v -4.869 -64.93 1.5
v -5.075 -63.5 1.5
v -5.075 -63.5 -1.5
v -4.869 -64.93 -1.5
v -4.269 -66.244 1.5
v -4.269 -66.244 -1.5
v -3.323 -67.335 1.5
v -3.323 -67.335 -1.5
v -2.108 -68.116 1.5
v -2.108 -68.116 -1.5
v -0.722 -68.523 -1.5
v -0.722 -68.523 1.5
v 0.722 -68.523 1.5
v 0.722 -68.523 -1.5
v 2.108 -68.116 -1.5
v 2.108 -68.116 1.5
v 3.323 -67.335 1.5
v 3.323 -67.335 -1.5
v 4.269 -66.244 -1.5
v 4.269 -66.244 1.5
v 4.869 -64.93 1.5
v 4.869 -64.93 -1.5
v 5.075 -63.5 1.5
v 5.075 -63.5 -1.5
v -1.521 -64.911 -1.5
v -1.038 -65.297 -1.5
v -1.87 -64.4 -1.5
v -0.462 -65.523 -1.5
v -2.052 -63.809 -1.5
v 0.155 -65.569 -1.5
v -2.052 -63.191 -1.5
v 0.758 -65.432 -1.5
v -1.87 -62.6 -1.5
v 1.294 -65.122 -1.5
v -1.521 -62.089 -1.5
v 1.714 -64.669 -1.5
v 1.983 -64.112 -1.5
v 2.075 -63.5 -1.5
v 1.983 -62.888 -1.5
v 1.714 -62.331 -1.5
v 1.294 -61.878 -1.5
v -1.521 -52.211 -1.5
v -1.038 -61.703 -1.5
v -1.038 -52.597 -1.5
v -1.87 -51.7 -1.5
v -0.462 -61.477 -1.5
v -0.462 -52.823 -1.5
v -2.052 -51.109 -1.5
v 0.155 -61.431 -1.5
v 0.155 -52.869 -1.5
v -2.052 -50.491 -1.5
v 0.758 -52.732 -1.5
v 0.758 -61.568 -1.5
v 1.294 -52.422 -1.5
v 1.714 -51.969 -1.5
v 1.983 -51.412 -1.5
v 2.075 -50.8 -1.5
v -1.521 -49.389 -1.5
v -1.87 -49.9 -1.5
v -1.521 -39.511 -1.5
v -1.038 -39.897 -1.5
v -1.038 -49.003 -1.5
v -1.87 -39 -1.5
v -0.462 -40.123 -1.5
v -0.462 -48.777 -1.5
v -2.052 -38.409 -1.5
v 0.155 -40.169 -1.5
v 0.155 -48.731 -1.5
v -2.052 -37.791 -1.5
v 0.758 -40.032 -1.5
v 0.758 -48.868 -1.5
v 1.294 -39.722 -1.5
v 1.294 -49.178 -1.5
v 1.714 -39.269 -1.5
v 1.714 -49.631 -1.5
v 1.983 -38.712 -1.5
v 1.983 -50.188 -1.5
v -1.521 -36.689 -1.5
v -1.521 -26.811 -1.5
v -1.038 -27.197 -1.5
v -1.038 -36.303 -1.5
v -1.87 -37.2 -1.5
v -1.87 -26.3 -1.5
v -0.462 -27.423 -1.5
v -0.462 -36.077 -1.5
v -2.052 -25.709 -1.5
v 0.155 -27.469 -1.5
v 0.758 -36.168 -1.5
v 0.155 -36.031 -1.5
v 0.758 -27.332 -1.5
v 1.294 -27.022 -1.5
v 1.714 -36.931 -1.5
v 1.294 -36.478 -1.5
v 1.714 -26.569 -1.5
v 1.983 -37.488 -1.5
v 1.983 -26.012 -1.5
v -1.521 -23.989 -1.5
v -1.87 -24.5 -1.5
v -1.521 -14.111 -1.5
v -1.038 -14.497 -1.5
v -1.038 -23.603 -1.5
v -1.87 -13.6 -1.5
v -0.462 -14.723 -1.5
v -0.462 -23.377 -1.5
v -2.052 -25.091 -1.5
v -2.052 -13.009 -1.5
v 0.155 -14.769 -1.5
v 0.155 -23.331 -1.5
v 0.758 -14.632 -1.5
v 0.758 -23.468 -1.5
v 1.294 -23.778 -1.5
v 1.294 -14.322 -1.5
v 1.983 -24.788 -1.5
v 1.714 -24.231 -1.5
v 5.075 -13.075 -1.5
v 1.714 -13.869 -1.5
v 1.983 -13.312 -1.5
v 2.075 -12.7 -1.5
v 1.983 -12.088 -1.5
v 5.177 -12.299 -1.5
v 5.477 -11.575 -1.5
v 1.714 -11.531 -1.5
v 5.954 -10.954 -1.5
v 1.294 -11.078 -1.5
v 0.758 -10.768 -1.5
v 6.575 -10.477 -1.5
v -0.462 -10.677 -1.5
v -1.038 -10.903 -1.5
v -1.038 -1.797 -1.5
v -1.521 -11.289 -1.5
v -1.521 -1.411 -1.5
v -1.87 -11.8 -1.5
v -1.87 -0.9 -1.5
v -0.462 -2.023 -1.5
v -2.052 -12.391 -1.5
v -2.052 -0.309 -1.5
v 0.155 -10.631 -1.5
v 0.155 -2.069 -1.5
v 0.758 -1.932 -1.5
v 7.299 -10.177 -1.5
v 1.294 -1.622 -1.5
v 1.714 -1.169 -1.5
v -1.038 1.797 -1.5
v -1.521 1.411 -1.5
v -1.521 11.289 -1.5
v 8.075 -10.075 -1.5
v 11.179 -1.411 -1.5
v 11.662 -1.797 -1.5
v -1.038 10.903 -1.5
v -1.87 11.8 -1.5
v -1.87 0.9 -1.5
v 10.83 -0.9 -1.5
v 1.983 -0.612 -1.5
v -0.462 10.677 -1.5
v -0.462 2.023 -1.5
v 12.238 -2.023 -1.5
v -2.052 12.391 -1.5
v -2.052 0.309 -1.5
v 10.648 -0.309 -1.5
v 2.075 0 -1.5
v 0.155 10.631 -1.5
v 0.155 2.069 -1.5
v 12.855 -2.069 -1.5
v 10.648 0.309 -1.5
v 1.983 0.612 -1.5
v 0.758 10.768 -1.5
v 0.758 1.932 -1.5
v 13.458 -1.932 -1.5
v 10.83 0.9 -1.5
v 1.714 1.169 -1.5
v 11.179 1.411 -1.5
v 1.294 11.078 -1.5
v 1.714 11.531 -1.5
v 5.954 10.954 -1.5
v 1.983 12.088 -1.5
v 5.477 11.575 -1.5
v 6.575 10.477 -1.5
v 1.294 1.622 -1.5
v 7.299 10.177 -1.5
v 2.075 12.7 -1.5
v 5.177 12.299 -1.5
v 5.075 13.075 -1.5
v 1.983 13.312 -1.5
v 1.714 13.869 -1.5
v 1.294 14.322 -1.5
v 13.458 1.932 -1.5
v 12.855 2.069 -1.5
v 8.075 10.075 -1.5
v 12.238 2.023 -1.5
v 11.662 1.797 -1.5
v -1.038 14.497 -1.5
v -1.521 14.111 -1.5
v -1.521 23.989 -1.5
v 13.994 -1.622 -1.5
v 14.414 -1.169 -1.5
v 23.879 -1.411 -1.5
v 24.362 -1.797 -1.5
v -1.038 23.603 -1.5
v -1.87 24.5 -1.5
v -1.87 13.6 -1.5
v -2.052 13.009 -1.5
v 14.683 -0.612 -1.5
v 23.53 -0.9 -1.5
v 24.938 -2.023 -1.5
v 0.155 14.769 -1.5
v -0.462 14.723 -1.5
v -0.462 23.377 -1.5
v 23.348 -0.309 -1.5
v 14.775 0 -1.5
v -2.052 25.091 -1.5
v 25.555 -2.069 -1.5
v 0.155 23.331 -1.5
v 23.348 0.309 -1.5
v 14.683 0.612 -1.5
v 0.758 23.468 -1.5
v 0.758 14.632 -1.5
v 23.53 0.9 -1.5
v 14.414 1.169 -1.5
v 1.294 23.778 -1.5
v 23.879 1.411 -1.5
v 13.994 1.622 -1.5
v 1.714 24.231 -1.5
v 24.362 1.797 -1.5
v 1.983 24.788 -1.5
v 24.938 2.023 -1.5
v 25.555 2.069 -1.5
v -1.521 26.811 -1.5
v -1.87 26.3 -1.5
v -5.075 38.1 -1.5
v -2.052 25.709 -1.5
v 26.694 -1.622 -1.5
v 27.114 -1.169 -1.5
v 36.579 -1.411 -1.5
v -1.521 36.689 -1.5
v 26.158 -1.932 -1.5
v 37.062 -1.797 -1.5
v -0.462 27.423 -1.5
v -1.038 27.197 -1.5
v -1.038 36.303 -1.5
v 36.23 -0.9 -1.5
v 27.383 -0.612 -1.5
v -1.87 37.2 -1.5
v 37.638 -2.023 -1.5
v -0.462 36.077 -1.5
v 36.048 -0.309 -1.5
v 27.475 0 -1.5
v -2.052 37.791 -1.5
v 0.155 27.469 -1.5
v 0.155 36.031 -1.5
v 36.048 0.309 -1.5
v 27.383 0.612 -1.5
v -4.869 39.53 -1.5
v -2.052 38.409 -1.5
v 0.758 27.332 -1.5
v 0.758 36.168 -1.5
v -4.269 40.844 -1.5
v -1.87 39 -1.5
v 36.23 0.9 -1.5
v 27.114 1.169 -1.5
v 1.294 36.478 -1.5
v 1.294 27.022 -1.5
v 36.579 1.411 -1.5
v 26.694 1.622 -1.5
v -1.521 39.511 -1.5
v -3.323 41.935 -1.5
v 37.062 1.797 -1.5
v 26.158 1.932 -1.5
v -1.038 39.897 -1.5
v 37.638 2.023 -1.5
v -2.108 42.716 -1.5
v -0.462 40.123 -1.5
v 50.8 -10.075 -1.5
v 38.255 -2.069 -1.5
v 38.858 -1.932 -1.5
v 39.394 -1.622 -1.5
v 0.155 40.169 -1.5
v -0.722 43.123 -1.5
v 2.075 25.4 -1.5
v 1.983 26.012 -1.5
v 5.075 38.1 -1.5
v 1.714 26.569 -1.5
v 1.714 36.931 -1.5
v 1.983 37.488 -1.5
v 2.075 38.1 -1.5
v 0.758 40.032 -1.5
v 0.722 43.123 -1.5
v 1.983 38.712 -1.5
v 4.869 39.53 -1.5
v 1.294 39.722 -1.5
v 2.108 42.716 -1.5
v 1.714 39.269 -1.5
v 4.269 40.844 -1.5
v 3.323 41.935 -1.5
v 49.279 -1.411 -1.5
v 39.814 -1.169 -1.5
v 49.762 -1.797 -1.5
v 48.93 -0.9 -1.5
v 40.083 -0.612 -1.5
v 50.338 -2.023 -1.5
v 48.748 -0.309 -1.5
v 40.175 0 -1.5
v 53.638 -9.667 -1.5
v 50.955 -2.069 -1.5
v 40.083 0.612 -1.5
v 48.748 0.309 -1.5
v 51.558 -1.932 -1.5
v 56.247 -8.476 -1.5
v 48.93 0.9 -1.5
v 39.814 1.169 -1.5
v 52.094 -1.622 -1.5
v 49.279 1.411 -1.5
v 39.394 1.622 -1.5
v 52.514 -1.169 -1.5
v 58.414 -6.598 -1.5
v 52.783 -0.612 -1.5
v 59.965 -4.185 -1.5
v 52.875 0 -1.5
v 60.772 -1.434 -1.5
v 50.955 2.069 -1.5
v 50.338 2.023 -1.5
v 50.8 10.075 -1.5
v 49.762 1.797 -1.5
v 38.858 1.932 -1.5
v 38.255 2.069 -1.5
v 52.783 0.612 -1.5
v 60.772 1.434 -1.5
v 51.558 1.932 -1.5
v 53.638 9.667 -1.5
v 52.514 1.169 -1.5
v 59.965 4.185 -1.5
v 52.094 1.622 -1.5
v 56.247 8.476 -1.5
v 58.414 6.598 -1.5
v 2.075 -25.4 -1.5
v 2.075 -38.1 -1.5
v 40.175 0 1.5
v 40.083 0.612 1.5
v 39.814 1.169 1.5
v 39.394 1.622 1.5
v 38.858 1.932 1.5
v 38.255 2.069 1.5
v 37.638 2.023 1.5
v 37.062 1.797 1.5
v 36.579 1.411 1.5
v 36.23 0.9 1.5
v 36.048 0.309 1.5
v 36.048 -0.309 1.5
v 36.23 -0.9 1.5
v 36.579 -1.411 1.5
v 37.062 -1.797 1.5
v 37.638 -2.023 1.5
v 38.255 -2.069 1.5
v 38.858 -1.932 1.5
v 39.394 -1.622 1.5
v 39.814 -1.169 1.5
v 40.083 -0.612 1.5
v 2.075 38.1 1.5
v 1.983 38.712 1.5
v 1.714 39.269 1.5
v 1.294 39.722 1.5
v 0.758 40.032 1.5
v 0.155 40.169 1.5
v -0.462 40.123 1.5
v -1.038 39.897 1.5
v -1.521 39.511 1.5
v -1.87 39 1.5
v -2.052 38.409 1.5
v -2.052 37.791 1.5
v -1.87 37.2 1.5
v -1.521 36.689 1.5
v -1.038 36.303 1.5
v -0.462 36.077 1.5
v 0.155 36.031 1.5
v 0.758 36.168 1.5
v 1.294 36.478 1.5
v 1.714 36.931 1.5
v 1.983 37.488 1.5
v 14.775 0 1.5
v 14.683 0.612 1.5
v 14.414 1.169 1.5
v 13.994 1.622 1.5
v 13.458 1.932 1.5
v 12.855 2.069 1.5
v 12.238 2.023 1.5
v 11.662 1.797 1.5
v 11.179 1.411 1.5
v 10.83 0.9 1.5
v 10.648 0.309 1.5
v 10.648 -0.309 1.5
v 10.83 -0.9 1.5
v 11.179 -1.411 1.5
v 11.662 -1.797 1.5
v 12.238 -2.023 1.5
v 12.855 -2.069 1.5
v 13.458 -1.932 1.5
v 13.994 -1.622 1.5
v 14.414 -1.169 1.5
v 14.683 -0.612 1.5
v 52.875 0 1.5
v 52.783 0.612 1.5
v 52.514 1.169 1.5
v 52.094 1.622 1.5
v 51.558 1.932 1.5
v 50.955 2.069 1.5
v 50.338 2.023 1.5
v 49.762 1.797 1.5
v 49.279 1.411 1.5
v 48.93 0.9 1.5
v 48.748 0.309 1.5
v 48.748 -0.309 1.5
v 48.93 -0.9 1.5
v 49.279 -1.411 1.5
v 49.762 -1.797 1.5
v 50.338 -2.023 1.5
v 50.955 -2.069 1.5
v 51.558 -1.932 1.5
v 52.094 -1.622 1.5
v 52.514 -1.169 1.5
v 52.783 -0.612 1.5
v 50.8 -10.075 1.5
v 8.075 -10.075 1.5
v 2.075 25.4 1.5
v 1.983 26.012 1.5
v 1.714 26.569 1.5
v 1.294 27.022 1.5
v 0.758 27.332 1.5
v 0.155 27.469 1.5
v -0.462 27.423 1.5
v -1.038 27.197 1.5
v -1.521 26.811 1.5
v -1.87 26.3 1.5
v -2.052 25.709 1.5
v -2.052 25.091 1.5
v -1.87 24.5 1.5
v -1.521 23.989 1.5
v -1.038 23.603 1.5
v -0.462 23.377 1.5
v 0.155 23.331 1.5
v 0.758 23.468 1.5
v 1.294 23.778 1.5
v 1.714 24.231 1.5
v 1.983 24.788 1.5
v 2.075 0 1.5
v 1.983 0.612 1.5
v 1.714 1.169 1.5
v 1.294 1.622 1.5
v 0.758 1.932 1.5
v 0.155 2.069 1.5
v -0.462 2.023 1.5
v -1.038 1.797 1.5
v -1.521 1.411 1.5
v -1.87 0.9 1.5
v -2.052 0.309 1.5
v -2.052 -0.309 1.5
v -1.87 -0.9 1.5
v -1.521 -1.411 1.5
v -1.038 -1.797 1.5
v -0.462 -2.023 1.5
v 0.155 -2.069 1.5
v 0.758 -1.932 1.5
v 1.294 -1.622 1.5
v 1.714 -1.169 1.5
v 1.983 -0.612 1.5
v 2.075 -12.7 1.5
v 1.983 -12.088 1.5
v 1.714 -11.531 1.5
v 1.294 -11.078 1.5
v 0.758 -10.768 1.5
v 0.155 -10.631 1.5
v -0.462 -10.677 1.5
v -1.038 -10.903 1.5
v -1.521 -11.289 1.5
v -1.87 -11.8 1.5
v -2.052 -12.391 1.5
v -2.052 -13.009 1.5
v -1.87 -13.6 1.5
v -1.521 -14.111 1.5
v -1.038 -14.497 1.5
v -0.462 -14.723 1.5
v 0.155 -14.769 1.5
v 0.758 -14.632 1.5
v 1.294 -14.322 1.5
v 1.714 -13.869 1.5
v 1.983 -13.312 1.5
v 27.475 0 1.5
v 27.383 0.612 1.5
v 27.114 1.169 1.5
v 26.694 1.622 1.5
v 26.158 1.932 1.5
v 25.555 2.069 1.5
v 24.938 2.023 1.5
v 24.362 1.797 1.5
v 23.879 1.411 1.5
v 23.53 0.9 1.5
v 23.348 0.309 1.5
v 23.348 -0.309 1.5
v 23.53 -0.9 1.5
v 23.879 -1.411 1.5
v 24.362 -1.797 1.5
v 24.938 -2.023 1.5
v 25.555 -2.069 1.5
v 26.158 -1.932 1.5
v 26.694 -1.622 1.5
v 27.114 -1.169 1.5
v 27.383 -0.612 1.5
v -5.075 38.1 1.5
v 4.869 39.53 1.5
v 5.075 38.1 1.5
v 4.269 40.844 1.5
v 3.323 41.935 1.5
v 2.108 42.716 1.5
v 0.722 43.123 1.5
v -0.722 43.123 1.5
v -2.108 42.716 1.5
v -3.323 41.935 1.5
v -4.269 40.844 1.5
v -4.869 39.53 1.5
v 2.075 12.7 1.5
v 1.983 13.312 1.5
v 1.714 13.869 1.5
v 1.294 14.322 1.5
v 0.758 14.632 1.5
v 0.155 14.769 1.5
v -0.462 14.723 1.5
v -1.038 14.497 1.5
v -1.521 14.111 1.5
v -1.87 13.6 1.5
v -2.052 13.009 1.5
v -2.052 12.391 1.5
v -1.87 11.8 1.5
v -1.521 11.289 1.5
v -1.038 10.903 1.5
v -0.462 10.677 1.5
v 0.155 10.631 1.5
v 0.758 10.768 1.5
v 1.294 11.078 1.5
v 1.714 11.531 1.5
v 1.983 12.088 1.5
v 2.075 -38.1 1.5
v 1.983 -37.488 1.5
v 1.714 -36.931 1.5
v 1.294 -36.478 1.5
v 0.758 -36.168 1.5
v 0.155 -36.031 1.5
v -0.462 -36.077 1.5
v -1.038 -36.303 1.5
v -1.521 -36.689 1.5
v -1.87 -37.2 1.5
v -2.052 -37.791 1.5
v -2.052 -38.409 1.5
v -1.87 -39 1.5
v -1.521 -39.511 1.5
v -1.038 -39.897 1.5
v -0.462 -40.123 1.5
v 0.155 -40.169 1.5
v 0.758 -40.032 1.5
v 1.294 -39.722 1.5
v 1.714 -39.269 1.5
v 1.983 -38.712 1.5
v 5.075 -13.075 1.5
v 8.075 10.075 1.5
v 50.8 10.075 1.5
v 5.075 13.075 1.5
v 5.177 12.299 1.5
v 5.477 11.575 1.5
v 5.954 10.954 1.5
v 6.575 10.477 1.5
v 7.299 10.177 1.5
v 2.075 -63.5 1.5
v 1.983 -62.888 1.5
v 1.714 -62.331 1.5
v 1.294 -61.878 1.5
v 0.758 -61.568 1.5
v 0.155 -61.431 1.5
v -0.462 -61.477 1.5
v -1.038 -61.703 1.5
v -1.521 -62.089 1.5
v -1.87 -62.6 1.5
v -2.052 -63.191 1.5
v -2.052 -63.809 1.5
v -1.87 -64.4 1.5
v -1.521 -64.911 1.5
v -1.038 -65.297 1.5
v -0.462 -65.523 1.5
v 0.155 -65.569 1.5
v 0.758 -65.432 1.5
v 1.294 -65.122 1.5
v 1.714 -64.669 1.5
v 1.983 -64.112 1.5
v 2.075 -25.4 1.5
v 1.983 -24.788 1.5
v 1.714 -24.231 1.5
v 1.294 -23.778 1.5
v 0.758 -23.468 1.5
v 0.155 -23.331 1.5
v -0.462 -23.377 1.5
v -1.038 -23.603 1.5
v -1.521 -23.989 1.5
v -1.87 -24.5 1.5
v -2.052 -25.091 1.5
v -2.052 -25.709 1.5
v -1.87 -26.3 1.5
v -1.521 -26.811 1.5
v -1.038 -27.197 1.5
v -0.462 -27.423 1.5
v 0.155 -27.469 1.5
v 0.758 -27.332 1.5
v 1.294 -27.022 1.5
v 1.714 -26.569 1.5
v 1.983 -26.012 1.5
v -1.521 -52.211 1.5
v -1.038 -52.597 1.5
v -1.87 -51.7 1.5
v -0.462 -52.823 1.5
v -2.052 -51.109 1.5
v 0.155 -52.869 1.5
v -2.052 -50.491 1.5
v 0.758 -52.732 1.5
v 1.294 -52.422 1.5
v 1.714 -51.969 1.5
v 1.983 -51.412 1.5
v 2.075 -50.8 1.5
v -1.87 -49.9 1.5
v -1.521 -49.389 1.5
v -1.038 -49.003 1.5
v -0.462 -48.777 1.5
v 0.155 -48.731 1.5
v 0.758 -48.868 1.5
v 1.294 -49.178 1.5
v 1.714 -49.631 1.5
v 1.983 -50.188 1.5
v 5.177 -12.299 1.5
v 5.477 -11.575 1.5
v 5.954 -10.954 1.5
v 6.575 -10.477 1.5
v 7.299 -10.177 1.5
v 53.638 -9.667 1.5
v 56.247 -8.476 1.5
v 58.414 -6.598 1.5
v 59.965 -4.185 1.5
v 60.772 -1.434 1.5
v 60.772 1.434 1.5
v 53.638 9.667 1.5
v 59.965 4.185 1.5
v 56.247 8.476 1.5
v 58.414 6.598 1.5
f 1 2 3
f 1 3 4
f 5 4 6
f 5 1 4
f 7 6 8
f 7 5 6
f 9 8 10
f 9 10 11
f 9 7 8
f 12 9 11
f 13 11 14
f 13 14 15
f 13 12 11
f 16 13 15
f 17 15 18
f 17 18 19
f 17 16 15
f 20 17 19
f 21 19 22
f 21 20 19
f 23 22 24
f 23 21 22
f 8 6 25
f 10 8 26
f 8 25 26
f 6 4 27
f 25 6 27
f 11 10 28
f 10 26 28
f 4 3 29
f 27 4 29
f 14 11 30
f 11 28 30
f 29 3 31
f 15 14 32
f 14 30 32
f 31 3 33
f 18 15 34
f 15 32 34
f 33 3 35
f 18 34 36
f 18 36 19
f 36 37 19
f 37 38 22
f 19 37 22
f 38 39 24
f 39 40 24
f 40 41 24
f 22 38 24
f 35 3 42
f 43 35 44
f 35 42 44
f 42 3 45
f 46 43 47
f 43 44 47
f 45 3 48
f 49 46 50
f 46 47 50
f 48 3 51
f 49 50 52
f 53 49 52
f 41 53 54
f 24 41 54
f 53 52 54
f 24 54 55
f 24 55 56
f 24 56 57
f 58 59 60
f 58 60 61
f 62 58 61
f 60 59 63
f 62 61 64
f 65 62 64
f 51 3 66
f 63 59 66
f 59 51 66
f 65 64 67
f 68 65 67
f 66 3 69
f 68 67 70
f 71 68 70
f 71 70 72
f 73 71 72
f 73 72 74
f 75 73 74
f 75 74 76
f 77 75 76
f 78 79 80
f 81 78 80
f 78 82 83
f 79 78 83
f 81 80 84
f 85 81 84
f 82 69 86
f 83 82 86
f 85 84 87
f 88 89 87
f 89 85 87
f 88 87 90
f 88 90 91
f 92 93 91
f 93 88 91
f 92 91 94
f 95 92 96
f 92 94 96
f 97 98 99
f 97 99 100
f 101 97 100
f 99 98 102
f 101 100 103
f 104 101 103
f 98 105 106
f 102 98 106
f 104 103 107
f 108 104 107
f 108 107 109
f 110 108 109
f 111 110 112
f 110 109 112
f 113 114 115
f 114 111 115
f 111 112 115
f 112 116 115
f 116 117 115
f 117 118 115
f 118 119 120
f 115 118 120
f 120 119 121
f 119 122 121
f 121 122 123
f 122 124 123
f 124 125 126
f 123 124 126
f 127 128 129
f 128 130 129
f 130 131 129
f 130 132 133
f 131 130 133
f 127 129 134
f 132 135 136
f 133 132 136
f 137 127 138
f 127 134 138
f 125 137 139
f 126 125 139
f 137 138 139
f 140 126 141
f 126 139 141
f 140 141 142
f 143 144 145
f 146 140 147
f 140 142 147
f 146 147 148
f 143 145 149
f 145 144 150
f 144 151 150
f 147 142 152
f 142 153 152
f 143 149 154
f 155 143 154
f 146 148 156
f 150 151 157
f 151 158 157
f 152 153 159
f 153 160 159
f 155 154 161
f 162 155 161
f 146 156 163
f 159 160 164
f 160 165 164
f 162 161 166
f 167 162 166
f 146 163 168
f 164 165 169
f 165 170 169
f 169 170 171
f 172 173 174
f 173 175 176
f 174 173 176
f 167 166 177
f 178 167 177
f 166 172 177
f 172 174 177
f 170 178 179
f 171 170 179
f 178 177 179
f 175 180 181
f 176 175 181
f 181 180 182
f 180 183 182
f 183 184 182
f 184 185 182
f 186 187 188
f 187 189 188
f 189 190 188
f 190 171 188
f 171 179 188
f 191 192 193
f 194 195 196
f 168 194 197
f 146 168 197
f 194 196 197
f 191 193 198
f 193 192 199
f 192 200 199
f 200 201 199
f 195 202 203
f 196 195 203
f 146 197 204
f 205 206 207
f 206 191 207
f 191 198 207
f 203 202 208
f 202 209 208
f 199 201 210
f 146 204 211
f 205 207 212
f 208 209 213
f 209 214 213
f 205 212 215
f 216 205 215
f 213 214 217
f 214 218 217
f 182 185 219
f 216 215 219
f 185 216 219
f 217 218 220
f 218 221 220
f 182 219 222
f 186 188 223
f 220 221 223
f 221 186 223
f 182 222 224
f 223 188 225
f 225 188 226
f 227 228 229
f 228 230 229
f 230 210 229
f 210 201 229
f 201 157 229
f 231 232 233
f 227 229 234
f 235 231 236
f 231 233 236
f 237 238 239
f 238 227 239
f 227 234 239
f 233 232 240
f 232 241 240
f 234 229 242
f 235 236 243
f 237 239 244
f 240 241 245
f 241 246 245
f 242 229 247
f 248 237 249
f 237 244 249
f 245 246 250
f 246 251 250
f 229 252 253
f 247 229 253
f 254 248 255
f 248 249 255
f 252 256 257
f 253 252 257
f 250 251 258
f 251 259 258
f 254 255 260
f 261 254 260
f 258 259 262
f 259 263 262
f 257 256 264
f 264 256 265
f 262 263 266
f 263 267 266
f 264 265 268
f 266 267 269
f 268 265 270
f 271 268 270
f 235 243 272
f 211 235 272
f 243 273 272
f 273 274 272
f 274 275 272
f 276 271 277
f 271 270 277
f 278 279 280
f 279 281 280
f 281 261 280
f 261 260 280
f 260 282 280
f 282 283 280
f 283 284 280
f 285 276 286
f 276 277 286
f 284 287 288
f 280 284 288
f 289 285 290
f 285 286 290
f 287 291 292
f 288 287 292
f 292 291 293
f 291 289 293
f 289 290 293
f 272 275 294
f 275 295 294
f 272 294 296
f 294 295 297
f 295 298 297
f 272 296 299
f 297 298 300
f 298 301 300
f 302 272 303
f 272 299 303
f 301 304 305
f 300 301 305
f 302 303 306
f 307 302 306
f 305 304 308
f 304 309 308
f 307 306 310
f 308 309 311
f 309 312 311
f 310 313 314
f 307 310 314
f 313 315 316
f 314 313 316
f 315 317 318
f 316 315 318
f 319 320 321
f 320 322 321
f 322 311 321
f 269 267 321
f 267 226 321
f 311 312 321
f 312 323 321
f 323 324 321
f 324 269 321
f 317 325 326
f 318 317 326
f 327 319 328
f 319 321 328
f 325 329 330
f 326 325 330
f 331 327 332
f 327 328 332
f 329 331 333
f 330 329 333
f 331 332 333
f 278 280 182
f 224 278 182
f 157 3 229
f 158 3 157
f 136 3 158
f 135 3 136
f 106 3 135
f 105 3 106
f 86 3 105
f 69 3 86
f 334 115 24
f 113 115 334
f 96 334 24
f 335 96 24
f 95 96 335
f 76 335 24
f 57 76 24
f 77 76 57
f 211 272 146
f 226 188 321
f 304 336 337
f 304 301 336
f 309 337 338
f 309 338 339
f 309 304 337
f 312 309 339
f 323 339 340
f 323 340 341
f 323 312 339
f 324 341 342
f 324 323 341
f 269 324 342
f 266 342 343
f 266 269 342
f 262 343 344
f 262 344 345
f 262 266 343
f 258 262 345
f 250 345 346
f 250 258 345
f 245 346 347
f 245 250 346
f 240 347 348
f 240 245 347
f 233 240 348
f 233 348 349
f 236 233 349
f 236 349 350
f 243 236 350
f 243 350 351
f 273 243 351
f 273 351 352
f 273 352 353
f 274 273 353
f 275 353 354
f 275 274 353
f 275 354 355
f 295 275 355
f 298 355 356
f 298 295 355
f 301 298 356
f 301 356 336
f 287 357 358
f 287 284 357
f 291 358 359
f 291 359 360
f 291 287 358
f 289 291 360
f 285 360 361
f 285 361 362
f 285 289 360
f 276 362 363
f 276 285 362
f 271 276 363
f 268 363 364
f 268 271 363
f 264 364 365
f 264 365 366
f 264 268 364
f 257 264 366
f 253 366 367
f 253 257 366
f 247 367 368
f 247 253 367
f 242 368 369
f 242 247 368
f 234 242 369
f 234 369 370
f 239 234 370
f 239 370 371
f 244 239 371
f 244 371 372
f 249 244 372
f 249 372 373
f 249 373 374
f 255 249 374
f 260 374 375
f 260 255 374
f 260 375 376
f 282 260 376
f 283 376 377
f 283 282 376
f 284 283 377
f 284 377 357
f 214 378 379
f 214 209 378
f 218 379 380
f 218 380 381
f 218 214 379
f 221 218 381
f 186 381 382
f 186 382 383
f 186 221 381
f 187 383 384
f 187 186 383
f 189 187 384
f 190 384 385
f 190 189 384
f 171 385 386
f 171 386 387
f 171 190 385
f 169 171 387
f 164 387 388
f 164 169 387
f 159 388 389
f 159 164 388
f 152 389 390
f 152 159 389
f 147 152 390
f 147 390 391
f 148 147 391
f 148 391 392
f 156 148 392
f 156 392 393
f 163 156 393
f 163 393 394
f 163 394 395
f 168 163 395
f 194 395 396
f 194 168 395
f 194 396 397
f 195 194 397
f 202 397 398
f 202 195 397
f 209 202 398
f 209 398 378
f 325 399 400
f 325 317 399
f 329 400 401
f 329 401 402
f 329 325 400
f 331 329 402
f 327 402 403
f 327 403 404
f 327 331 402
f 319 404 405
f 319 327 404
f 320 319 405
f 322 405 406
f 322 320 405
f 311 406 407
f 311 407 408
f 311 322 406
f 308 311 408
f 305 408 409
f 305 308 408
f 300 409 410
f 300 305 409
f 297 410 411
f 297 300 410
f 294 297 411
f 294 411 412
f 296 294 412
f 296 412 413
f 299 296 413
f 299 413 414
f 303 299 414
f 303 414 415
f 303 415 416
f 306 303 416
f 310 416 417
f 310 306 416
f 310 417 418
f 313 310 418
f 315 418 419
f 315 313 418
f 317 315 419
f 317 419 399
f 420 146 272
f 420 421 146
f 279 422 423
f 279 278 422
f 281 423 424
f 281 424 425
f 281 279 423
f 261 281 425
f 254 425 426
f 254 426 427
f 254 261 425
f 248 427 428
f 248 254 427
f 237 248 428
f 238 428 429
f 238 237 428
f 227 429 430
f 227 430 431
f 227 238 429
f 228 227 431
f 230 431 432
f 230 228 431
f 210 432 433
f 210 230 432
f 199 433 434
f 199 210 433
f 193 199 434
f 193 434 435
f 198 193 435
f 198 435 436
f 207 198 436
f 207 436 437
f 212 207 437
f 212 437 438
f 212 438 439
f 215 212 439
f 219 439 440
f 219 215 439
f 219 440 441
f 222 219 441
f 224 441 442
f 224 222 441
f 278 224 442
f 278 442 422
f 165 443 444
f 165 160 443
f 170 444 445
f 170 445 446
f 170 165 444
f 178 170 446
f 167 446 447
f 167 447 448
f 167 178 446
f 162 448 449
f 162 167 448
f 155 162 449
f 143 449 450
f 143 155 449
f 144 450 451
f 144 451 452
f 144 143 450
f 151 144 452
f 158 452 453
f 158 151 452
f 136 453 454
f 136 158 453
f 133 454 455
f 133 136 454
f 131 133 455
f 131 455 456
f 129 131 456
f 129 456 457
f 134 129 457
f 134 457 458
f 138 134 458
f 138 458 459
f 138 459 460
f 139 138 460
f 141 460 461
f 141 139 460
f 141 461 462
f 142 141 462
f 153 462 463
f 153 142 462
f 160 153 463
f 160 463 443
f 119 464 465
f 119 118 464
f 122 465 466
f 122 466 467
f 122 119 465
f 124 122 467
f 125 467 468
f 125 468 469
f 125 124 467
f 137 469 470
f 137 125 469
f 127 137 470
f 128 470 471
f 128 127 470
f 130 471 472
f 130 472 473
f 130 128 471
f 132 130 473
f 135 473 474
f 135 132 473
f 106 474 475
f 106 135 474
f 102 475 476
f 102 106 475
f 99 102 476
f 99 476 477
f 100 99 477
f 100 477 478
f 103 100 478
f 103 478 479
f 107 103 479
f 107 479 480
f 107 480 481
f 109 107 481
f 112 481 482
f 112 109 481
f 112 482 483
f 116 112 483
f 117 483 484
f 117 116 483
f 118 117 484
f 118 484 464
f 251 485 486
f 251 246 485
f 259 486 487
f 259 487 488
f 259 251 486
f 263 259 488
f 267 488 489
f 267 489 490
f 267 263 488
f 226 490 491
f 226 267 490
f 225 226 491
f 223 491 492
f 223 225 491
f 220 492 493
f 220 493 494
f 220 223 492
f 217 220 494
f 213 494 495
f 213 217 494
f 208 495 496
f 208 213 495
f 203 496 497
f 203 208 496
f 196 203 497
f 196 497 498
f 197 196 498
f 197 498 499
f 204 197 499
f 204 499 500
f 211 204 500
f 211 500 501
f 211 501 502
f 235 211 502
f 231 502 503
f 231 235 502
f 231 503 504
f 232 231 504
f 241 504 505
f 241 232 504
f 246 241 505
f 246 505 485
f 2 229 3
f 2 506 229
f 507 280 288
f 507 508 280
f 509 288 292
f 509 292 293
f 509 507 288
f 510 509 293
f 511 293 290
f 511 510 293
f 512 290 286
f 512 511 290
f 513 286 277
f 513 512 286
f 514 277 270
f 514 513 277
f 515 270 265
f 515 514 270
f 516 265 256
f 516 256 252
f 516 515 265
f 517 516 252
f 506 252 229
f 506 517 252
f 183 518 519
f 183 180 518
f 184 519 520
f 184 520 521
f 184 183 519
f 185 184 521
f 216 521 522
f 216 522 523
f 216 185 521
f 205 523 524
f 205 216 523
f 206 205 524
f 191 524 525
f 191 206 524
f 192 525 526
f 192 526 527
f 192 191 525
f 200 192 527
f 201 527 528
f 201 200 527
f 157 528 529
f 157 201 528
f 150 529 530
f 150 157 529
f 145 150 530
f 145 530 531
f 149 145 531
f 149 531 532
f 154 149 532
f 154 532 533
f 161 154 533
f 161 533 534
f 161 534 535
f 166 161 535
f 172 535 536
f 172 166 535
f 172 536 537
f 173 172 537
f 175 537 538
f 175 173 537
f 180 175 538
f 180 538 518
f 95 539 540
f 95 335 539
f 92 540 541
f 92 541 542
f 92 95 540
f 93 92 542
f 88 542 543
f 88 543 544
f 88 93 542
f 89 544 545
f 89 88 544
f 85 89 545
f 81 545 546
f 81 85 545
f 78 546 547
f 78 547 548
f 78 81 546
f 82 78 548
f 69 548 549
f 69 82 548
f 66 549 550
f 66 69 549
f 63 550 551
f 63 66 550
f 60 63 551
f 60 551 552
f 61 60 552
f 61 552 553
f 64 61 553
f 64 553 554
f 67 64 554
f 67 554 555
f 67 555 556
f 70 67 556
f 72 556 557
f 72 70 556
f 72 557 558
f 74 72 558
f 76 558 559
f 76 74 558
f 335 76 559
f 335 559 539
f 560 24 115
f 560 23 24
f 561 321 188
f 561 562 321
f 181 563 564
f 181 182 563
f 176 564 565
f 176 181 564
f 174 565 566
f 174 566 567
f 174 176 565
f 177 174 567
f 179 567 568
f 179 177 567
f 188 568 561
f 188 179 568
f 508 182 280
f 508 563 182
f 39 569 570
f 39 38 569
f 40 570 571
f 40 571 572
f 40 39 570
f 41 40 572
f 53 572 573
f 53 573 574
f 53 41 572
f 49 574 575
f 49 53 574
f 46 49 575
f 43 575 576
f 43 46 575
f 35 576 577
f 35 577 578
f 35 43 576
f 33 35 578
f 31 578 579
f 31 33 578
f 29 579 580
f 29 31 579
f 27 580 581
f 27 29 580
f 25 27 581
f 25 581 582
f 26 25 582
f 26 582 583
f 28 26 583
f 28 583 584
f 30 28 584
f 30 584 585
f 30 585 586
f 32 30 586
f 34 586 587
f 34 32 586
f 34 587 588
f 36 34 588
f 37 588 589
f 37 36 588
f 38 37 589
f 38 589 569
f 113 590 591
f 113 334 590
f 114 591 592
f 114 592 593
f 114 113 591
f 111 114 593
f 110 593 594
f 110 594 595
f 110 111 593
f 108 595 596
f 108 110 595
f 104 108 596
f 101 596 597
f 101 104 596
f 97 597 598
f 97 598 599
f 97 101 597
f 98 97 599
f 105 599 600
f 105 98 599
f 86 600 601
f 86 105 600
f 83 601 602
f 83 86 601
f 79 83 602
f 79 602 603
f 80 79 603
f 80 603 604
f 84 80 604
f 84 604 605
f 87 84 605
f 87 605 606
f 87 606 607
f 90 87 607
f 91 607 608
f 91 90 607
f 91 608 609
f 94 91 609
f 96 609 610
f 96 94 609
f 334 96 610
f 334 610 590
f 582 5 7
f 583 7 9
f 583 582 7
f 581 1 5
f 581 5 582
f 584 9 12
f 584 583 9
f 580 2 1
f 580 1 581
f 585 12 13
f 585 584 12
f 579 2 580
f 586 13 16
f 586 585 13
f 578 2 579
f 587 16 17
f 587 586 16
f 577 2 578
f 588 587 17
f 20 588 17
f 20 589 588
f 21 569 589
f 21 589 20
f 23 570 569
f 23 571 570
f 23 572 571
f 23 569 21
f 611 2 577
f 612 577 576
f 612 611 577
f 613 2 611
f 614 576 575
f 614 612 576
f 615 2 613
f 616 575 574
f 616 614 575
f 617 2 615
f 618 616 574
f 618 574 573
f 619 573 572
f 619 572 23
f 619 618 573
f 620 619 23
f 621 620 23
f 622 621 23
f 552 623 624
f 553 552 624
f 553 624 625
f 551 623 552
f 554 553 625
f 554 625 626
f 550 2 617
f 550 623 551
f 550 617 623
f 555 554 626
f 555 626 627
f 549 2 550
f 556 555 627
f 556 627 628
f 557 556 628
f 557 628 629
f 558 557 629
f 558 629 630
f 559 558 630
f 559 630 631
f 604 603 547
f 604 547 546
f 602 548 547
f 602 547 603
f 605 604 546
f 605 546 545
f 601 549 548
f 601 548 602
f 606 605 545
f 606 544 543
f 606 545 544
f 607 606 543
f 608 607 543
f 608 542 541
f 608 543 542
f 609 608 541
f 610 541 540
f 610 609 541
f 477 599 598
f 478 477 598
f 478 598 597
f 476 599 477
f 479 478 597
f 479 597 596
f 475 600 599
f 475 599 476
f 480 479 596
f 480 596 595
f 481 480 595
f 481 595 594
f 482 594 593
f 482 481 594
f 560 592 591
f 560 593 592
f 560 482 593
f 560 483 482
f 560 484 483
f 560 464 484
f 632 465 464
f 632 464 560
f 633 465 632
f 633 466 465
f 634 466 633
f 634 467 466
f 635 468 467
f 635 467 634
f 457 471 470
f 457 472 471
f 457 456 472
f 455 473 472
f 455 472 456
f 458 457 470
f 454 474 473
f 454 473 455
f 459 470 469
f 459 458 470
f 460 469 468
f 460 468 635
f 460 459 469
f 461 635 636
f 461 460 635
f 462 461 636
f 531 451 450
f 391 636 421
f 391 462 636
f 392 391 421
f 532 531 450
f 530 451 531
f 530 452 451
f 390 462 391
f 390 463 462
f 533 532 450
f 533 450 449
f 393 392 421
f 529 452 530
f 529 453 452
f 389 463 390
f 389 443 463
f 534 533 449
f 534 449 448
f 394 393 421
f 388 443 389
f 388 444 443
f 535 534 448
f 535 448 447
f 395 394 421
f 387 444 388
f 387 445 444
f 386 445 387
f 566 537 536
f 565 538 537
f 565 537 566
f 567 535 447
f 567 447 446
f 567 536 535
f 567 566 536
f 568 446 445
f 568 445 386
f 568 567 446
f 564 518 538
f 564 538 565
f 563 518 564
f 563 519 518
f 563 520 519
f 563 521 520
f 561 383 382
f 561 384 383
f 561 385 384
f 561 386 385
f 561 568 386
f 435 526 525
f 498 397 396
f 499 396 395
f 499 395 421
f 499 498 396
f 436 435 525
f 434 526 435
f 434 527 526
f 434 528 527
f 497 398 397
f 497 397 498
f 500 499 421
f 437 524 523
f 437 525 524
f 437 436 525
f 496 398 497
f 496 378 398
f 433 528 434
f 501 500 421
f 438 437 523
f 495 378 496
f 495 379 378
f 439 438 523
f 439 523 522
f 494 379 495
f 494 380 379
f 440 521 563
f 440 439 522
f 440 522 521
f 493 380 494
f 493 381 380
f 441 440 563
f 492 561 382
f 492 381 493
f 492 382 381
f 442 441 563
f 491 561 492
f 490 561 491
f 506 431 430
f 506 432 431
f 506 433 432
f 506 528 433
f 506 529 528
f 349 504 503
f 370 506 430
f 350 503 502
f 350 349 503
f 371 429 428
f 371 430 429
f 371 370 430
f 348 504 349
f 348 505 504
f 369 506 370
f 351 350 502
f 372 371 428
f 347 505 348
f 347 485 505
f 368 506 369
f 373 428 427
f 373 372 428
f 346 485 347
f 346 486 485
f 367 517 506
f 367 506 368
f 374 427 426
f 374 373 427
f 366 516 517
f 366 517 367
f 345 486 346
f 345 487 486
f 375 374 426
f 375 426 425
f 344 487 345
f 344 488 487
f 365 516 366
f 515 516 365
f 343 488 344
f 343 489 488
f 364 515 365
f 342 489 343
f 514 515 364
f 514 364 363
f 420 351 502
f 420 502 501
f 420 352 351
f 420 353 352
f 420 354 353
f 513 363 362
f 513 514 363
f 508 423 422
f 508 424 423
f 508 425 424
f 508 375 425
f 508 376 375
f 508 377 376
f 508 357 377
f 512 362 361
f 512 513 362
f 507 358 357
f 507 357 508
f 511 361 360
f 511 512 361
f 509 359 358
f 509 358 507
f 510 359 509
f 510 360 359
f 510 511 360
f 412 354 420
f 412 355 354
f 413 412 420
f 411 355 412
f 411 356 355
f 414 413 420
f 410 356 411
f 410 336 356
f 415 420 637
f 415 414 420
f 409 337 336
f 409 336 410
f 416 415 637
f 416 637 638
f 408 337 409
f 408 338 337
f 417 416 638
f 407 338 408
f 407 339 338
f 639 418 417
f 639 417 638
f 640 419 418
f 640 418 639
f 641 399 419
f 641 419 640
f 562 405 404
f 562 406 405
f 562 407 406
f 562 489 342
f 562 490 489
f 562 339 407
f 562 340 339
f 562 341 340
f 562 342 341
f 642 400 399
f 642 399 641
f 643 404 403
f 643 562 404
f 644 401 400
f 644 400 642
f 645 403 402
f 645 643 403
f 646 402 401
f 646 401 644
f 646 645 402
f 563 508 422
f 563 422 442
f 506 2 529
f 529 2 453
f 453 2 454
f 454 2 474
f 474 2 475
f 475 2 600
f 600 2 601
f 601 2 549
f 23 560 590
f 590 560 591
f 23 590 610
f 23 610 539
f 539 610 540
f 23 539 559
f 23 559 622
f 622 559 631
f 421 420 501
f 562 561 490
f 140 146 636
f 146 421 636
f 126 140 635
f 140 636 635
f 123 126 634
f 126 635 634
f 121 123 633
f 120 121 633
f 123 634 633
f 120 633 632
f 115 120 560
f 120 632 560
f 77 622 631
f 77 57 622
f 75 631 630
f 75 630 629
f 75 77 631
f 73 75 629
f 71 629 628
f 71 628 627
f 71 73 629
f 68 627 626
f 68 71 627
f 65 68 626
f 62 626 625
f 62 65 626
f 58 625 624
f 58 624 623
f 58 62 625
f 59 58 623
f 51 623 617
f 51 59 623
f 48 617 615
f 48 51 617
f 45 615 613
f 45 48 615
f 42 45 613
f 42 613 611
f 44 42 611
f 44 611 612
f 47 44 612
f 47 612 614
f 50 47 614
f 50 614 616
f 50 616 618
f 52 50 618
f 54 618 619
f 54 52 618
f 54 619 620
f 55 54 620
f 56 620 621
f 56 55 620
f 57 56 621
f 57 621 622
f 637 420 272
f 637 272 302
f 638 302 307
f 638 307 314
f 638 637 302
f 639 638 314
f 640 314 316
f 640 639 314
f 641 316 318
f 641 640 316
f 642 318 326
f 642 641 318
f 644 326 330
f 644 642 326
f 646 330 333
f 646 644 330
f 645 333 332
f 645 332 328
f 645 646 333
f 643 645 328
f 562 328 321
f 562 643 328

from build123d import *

# Parameters (mm, degrees)
SKETCH1_R           = 2.075
BOSS_EXTRUDE2_DEPTH = 1.5
FILLET2_R           = 3


with BuildPart() as part:
    # Sketch1 → Boss-Extrude2 (new, symmetric)
    with BuildSketch(Plane.XY):
        with BuildLine():
            Line((-5.075, 38.1), (-5.075, -63.5))
            ThreePointArc((-5.075, -63.5), (0, -68.575), (5.075, -63.5))
            Line((5.075, -63.5), (5.075, -10.075))
            Line((5.075, -10.075), (50.8, -10.075))
            ThreePointArc((50.8, -10.075), (60.875, 0), (50.8, 10.075))
            Line((50.8, 10.075), (5.075, 10.075))
            Line((5.075, 10.075), (5.075, 38.1))
            ThreePointArc((5.075, 38.1), (0, 43.175), (-5.075, 38.1))
        make_face()
        Circle(SKETCH1_R, mode=Mode.SUBTRACT)
        with Locations((12.7, 0)):
            Circle(SKETCH1_R, mode=Mode.SUBTRACT)
        with Locations((25.4, 0)):
            Circle(SKETCH1_R, mode=Mode.SUBTRACT)
        with Locations((38.1, 0)):
            Circle(SKETCH1_R, mode=Mode.SUBTRACT)
        with Locations((50.8, 0)):
            Circle(SKETCH1_R, mode=Mode.SUBTRACT)
        with Locations((0, 12.7)):
            Circle(SKETCH1_R, mode=Mode.SUBTRACT)
        with Locations((0, 25.4)):
            Circle(SKETCH1_R, mode=Mode.SUBTRACT)
        with Locations((0, 38.1)):
            Circle(SKETCH1_R, mode=Mode.SUBTRACT)
        with Locations((0, -12.7)):
            Circle(SKETCH1_R, mode=Mode.SUBTRACT)
        with Locations((0, -25.4)):
            Circle(SKETCH1_R, mode=Mode.SUBTRACT)
        with Locations((0, -38.1)):
            Circle(SKETCH1_R, mode=Mode.SUBTRACT)
        with Locations((0, -50.8)):
            Circle(SKETCH1_R, mode=Mode.SUBTRACT)
        with Locations((0, -63.5)):
            Circle(SKETCH1_R, mode=Mode.SUBTRACT)
    extrude(amount=BOSS_EXTRUDE2_DEPTH, both=True)

    # Fillet2
    fillet2_edges = [part.edges().sort_by_distance(p)[0] for p in [
        (5.075, 10.075, 0),
        (5.075, -10.075, 0),
    ]]
    fillet(fillet2_edges, radius=FILLET2_R)


solid = part.part
